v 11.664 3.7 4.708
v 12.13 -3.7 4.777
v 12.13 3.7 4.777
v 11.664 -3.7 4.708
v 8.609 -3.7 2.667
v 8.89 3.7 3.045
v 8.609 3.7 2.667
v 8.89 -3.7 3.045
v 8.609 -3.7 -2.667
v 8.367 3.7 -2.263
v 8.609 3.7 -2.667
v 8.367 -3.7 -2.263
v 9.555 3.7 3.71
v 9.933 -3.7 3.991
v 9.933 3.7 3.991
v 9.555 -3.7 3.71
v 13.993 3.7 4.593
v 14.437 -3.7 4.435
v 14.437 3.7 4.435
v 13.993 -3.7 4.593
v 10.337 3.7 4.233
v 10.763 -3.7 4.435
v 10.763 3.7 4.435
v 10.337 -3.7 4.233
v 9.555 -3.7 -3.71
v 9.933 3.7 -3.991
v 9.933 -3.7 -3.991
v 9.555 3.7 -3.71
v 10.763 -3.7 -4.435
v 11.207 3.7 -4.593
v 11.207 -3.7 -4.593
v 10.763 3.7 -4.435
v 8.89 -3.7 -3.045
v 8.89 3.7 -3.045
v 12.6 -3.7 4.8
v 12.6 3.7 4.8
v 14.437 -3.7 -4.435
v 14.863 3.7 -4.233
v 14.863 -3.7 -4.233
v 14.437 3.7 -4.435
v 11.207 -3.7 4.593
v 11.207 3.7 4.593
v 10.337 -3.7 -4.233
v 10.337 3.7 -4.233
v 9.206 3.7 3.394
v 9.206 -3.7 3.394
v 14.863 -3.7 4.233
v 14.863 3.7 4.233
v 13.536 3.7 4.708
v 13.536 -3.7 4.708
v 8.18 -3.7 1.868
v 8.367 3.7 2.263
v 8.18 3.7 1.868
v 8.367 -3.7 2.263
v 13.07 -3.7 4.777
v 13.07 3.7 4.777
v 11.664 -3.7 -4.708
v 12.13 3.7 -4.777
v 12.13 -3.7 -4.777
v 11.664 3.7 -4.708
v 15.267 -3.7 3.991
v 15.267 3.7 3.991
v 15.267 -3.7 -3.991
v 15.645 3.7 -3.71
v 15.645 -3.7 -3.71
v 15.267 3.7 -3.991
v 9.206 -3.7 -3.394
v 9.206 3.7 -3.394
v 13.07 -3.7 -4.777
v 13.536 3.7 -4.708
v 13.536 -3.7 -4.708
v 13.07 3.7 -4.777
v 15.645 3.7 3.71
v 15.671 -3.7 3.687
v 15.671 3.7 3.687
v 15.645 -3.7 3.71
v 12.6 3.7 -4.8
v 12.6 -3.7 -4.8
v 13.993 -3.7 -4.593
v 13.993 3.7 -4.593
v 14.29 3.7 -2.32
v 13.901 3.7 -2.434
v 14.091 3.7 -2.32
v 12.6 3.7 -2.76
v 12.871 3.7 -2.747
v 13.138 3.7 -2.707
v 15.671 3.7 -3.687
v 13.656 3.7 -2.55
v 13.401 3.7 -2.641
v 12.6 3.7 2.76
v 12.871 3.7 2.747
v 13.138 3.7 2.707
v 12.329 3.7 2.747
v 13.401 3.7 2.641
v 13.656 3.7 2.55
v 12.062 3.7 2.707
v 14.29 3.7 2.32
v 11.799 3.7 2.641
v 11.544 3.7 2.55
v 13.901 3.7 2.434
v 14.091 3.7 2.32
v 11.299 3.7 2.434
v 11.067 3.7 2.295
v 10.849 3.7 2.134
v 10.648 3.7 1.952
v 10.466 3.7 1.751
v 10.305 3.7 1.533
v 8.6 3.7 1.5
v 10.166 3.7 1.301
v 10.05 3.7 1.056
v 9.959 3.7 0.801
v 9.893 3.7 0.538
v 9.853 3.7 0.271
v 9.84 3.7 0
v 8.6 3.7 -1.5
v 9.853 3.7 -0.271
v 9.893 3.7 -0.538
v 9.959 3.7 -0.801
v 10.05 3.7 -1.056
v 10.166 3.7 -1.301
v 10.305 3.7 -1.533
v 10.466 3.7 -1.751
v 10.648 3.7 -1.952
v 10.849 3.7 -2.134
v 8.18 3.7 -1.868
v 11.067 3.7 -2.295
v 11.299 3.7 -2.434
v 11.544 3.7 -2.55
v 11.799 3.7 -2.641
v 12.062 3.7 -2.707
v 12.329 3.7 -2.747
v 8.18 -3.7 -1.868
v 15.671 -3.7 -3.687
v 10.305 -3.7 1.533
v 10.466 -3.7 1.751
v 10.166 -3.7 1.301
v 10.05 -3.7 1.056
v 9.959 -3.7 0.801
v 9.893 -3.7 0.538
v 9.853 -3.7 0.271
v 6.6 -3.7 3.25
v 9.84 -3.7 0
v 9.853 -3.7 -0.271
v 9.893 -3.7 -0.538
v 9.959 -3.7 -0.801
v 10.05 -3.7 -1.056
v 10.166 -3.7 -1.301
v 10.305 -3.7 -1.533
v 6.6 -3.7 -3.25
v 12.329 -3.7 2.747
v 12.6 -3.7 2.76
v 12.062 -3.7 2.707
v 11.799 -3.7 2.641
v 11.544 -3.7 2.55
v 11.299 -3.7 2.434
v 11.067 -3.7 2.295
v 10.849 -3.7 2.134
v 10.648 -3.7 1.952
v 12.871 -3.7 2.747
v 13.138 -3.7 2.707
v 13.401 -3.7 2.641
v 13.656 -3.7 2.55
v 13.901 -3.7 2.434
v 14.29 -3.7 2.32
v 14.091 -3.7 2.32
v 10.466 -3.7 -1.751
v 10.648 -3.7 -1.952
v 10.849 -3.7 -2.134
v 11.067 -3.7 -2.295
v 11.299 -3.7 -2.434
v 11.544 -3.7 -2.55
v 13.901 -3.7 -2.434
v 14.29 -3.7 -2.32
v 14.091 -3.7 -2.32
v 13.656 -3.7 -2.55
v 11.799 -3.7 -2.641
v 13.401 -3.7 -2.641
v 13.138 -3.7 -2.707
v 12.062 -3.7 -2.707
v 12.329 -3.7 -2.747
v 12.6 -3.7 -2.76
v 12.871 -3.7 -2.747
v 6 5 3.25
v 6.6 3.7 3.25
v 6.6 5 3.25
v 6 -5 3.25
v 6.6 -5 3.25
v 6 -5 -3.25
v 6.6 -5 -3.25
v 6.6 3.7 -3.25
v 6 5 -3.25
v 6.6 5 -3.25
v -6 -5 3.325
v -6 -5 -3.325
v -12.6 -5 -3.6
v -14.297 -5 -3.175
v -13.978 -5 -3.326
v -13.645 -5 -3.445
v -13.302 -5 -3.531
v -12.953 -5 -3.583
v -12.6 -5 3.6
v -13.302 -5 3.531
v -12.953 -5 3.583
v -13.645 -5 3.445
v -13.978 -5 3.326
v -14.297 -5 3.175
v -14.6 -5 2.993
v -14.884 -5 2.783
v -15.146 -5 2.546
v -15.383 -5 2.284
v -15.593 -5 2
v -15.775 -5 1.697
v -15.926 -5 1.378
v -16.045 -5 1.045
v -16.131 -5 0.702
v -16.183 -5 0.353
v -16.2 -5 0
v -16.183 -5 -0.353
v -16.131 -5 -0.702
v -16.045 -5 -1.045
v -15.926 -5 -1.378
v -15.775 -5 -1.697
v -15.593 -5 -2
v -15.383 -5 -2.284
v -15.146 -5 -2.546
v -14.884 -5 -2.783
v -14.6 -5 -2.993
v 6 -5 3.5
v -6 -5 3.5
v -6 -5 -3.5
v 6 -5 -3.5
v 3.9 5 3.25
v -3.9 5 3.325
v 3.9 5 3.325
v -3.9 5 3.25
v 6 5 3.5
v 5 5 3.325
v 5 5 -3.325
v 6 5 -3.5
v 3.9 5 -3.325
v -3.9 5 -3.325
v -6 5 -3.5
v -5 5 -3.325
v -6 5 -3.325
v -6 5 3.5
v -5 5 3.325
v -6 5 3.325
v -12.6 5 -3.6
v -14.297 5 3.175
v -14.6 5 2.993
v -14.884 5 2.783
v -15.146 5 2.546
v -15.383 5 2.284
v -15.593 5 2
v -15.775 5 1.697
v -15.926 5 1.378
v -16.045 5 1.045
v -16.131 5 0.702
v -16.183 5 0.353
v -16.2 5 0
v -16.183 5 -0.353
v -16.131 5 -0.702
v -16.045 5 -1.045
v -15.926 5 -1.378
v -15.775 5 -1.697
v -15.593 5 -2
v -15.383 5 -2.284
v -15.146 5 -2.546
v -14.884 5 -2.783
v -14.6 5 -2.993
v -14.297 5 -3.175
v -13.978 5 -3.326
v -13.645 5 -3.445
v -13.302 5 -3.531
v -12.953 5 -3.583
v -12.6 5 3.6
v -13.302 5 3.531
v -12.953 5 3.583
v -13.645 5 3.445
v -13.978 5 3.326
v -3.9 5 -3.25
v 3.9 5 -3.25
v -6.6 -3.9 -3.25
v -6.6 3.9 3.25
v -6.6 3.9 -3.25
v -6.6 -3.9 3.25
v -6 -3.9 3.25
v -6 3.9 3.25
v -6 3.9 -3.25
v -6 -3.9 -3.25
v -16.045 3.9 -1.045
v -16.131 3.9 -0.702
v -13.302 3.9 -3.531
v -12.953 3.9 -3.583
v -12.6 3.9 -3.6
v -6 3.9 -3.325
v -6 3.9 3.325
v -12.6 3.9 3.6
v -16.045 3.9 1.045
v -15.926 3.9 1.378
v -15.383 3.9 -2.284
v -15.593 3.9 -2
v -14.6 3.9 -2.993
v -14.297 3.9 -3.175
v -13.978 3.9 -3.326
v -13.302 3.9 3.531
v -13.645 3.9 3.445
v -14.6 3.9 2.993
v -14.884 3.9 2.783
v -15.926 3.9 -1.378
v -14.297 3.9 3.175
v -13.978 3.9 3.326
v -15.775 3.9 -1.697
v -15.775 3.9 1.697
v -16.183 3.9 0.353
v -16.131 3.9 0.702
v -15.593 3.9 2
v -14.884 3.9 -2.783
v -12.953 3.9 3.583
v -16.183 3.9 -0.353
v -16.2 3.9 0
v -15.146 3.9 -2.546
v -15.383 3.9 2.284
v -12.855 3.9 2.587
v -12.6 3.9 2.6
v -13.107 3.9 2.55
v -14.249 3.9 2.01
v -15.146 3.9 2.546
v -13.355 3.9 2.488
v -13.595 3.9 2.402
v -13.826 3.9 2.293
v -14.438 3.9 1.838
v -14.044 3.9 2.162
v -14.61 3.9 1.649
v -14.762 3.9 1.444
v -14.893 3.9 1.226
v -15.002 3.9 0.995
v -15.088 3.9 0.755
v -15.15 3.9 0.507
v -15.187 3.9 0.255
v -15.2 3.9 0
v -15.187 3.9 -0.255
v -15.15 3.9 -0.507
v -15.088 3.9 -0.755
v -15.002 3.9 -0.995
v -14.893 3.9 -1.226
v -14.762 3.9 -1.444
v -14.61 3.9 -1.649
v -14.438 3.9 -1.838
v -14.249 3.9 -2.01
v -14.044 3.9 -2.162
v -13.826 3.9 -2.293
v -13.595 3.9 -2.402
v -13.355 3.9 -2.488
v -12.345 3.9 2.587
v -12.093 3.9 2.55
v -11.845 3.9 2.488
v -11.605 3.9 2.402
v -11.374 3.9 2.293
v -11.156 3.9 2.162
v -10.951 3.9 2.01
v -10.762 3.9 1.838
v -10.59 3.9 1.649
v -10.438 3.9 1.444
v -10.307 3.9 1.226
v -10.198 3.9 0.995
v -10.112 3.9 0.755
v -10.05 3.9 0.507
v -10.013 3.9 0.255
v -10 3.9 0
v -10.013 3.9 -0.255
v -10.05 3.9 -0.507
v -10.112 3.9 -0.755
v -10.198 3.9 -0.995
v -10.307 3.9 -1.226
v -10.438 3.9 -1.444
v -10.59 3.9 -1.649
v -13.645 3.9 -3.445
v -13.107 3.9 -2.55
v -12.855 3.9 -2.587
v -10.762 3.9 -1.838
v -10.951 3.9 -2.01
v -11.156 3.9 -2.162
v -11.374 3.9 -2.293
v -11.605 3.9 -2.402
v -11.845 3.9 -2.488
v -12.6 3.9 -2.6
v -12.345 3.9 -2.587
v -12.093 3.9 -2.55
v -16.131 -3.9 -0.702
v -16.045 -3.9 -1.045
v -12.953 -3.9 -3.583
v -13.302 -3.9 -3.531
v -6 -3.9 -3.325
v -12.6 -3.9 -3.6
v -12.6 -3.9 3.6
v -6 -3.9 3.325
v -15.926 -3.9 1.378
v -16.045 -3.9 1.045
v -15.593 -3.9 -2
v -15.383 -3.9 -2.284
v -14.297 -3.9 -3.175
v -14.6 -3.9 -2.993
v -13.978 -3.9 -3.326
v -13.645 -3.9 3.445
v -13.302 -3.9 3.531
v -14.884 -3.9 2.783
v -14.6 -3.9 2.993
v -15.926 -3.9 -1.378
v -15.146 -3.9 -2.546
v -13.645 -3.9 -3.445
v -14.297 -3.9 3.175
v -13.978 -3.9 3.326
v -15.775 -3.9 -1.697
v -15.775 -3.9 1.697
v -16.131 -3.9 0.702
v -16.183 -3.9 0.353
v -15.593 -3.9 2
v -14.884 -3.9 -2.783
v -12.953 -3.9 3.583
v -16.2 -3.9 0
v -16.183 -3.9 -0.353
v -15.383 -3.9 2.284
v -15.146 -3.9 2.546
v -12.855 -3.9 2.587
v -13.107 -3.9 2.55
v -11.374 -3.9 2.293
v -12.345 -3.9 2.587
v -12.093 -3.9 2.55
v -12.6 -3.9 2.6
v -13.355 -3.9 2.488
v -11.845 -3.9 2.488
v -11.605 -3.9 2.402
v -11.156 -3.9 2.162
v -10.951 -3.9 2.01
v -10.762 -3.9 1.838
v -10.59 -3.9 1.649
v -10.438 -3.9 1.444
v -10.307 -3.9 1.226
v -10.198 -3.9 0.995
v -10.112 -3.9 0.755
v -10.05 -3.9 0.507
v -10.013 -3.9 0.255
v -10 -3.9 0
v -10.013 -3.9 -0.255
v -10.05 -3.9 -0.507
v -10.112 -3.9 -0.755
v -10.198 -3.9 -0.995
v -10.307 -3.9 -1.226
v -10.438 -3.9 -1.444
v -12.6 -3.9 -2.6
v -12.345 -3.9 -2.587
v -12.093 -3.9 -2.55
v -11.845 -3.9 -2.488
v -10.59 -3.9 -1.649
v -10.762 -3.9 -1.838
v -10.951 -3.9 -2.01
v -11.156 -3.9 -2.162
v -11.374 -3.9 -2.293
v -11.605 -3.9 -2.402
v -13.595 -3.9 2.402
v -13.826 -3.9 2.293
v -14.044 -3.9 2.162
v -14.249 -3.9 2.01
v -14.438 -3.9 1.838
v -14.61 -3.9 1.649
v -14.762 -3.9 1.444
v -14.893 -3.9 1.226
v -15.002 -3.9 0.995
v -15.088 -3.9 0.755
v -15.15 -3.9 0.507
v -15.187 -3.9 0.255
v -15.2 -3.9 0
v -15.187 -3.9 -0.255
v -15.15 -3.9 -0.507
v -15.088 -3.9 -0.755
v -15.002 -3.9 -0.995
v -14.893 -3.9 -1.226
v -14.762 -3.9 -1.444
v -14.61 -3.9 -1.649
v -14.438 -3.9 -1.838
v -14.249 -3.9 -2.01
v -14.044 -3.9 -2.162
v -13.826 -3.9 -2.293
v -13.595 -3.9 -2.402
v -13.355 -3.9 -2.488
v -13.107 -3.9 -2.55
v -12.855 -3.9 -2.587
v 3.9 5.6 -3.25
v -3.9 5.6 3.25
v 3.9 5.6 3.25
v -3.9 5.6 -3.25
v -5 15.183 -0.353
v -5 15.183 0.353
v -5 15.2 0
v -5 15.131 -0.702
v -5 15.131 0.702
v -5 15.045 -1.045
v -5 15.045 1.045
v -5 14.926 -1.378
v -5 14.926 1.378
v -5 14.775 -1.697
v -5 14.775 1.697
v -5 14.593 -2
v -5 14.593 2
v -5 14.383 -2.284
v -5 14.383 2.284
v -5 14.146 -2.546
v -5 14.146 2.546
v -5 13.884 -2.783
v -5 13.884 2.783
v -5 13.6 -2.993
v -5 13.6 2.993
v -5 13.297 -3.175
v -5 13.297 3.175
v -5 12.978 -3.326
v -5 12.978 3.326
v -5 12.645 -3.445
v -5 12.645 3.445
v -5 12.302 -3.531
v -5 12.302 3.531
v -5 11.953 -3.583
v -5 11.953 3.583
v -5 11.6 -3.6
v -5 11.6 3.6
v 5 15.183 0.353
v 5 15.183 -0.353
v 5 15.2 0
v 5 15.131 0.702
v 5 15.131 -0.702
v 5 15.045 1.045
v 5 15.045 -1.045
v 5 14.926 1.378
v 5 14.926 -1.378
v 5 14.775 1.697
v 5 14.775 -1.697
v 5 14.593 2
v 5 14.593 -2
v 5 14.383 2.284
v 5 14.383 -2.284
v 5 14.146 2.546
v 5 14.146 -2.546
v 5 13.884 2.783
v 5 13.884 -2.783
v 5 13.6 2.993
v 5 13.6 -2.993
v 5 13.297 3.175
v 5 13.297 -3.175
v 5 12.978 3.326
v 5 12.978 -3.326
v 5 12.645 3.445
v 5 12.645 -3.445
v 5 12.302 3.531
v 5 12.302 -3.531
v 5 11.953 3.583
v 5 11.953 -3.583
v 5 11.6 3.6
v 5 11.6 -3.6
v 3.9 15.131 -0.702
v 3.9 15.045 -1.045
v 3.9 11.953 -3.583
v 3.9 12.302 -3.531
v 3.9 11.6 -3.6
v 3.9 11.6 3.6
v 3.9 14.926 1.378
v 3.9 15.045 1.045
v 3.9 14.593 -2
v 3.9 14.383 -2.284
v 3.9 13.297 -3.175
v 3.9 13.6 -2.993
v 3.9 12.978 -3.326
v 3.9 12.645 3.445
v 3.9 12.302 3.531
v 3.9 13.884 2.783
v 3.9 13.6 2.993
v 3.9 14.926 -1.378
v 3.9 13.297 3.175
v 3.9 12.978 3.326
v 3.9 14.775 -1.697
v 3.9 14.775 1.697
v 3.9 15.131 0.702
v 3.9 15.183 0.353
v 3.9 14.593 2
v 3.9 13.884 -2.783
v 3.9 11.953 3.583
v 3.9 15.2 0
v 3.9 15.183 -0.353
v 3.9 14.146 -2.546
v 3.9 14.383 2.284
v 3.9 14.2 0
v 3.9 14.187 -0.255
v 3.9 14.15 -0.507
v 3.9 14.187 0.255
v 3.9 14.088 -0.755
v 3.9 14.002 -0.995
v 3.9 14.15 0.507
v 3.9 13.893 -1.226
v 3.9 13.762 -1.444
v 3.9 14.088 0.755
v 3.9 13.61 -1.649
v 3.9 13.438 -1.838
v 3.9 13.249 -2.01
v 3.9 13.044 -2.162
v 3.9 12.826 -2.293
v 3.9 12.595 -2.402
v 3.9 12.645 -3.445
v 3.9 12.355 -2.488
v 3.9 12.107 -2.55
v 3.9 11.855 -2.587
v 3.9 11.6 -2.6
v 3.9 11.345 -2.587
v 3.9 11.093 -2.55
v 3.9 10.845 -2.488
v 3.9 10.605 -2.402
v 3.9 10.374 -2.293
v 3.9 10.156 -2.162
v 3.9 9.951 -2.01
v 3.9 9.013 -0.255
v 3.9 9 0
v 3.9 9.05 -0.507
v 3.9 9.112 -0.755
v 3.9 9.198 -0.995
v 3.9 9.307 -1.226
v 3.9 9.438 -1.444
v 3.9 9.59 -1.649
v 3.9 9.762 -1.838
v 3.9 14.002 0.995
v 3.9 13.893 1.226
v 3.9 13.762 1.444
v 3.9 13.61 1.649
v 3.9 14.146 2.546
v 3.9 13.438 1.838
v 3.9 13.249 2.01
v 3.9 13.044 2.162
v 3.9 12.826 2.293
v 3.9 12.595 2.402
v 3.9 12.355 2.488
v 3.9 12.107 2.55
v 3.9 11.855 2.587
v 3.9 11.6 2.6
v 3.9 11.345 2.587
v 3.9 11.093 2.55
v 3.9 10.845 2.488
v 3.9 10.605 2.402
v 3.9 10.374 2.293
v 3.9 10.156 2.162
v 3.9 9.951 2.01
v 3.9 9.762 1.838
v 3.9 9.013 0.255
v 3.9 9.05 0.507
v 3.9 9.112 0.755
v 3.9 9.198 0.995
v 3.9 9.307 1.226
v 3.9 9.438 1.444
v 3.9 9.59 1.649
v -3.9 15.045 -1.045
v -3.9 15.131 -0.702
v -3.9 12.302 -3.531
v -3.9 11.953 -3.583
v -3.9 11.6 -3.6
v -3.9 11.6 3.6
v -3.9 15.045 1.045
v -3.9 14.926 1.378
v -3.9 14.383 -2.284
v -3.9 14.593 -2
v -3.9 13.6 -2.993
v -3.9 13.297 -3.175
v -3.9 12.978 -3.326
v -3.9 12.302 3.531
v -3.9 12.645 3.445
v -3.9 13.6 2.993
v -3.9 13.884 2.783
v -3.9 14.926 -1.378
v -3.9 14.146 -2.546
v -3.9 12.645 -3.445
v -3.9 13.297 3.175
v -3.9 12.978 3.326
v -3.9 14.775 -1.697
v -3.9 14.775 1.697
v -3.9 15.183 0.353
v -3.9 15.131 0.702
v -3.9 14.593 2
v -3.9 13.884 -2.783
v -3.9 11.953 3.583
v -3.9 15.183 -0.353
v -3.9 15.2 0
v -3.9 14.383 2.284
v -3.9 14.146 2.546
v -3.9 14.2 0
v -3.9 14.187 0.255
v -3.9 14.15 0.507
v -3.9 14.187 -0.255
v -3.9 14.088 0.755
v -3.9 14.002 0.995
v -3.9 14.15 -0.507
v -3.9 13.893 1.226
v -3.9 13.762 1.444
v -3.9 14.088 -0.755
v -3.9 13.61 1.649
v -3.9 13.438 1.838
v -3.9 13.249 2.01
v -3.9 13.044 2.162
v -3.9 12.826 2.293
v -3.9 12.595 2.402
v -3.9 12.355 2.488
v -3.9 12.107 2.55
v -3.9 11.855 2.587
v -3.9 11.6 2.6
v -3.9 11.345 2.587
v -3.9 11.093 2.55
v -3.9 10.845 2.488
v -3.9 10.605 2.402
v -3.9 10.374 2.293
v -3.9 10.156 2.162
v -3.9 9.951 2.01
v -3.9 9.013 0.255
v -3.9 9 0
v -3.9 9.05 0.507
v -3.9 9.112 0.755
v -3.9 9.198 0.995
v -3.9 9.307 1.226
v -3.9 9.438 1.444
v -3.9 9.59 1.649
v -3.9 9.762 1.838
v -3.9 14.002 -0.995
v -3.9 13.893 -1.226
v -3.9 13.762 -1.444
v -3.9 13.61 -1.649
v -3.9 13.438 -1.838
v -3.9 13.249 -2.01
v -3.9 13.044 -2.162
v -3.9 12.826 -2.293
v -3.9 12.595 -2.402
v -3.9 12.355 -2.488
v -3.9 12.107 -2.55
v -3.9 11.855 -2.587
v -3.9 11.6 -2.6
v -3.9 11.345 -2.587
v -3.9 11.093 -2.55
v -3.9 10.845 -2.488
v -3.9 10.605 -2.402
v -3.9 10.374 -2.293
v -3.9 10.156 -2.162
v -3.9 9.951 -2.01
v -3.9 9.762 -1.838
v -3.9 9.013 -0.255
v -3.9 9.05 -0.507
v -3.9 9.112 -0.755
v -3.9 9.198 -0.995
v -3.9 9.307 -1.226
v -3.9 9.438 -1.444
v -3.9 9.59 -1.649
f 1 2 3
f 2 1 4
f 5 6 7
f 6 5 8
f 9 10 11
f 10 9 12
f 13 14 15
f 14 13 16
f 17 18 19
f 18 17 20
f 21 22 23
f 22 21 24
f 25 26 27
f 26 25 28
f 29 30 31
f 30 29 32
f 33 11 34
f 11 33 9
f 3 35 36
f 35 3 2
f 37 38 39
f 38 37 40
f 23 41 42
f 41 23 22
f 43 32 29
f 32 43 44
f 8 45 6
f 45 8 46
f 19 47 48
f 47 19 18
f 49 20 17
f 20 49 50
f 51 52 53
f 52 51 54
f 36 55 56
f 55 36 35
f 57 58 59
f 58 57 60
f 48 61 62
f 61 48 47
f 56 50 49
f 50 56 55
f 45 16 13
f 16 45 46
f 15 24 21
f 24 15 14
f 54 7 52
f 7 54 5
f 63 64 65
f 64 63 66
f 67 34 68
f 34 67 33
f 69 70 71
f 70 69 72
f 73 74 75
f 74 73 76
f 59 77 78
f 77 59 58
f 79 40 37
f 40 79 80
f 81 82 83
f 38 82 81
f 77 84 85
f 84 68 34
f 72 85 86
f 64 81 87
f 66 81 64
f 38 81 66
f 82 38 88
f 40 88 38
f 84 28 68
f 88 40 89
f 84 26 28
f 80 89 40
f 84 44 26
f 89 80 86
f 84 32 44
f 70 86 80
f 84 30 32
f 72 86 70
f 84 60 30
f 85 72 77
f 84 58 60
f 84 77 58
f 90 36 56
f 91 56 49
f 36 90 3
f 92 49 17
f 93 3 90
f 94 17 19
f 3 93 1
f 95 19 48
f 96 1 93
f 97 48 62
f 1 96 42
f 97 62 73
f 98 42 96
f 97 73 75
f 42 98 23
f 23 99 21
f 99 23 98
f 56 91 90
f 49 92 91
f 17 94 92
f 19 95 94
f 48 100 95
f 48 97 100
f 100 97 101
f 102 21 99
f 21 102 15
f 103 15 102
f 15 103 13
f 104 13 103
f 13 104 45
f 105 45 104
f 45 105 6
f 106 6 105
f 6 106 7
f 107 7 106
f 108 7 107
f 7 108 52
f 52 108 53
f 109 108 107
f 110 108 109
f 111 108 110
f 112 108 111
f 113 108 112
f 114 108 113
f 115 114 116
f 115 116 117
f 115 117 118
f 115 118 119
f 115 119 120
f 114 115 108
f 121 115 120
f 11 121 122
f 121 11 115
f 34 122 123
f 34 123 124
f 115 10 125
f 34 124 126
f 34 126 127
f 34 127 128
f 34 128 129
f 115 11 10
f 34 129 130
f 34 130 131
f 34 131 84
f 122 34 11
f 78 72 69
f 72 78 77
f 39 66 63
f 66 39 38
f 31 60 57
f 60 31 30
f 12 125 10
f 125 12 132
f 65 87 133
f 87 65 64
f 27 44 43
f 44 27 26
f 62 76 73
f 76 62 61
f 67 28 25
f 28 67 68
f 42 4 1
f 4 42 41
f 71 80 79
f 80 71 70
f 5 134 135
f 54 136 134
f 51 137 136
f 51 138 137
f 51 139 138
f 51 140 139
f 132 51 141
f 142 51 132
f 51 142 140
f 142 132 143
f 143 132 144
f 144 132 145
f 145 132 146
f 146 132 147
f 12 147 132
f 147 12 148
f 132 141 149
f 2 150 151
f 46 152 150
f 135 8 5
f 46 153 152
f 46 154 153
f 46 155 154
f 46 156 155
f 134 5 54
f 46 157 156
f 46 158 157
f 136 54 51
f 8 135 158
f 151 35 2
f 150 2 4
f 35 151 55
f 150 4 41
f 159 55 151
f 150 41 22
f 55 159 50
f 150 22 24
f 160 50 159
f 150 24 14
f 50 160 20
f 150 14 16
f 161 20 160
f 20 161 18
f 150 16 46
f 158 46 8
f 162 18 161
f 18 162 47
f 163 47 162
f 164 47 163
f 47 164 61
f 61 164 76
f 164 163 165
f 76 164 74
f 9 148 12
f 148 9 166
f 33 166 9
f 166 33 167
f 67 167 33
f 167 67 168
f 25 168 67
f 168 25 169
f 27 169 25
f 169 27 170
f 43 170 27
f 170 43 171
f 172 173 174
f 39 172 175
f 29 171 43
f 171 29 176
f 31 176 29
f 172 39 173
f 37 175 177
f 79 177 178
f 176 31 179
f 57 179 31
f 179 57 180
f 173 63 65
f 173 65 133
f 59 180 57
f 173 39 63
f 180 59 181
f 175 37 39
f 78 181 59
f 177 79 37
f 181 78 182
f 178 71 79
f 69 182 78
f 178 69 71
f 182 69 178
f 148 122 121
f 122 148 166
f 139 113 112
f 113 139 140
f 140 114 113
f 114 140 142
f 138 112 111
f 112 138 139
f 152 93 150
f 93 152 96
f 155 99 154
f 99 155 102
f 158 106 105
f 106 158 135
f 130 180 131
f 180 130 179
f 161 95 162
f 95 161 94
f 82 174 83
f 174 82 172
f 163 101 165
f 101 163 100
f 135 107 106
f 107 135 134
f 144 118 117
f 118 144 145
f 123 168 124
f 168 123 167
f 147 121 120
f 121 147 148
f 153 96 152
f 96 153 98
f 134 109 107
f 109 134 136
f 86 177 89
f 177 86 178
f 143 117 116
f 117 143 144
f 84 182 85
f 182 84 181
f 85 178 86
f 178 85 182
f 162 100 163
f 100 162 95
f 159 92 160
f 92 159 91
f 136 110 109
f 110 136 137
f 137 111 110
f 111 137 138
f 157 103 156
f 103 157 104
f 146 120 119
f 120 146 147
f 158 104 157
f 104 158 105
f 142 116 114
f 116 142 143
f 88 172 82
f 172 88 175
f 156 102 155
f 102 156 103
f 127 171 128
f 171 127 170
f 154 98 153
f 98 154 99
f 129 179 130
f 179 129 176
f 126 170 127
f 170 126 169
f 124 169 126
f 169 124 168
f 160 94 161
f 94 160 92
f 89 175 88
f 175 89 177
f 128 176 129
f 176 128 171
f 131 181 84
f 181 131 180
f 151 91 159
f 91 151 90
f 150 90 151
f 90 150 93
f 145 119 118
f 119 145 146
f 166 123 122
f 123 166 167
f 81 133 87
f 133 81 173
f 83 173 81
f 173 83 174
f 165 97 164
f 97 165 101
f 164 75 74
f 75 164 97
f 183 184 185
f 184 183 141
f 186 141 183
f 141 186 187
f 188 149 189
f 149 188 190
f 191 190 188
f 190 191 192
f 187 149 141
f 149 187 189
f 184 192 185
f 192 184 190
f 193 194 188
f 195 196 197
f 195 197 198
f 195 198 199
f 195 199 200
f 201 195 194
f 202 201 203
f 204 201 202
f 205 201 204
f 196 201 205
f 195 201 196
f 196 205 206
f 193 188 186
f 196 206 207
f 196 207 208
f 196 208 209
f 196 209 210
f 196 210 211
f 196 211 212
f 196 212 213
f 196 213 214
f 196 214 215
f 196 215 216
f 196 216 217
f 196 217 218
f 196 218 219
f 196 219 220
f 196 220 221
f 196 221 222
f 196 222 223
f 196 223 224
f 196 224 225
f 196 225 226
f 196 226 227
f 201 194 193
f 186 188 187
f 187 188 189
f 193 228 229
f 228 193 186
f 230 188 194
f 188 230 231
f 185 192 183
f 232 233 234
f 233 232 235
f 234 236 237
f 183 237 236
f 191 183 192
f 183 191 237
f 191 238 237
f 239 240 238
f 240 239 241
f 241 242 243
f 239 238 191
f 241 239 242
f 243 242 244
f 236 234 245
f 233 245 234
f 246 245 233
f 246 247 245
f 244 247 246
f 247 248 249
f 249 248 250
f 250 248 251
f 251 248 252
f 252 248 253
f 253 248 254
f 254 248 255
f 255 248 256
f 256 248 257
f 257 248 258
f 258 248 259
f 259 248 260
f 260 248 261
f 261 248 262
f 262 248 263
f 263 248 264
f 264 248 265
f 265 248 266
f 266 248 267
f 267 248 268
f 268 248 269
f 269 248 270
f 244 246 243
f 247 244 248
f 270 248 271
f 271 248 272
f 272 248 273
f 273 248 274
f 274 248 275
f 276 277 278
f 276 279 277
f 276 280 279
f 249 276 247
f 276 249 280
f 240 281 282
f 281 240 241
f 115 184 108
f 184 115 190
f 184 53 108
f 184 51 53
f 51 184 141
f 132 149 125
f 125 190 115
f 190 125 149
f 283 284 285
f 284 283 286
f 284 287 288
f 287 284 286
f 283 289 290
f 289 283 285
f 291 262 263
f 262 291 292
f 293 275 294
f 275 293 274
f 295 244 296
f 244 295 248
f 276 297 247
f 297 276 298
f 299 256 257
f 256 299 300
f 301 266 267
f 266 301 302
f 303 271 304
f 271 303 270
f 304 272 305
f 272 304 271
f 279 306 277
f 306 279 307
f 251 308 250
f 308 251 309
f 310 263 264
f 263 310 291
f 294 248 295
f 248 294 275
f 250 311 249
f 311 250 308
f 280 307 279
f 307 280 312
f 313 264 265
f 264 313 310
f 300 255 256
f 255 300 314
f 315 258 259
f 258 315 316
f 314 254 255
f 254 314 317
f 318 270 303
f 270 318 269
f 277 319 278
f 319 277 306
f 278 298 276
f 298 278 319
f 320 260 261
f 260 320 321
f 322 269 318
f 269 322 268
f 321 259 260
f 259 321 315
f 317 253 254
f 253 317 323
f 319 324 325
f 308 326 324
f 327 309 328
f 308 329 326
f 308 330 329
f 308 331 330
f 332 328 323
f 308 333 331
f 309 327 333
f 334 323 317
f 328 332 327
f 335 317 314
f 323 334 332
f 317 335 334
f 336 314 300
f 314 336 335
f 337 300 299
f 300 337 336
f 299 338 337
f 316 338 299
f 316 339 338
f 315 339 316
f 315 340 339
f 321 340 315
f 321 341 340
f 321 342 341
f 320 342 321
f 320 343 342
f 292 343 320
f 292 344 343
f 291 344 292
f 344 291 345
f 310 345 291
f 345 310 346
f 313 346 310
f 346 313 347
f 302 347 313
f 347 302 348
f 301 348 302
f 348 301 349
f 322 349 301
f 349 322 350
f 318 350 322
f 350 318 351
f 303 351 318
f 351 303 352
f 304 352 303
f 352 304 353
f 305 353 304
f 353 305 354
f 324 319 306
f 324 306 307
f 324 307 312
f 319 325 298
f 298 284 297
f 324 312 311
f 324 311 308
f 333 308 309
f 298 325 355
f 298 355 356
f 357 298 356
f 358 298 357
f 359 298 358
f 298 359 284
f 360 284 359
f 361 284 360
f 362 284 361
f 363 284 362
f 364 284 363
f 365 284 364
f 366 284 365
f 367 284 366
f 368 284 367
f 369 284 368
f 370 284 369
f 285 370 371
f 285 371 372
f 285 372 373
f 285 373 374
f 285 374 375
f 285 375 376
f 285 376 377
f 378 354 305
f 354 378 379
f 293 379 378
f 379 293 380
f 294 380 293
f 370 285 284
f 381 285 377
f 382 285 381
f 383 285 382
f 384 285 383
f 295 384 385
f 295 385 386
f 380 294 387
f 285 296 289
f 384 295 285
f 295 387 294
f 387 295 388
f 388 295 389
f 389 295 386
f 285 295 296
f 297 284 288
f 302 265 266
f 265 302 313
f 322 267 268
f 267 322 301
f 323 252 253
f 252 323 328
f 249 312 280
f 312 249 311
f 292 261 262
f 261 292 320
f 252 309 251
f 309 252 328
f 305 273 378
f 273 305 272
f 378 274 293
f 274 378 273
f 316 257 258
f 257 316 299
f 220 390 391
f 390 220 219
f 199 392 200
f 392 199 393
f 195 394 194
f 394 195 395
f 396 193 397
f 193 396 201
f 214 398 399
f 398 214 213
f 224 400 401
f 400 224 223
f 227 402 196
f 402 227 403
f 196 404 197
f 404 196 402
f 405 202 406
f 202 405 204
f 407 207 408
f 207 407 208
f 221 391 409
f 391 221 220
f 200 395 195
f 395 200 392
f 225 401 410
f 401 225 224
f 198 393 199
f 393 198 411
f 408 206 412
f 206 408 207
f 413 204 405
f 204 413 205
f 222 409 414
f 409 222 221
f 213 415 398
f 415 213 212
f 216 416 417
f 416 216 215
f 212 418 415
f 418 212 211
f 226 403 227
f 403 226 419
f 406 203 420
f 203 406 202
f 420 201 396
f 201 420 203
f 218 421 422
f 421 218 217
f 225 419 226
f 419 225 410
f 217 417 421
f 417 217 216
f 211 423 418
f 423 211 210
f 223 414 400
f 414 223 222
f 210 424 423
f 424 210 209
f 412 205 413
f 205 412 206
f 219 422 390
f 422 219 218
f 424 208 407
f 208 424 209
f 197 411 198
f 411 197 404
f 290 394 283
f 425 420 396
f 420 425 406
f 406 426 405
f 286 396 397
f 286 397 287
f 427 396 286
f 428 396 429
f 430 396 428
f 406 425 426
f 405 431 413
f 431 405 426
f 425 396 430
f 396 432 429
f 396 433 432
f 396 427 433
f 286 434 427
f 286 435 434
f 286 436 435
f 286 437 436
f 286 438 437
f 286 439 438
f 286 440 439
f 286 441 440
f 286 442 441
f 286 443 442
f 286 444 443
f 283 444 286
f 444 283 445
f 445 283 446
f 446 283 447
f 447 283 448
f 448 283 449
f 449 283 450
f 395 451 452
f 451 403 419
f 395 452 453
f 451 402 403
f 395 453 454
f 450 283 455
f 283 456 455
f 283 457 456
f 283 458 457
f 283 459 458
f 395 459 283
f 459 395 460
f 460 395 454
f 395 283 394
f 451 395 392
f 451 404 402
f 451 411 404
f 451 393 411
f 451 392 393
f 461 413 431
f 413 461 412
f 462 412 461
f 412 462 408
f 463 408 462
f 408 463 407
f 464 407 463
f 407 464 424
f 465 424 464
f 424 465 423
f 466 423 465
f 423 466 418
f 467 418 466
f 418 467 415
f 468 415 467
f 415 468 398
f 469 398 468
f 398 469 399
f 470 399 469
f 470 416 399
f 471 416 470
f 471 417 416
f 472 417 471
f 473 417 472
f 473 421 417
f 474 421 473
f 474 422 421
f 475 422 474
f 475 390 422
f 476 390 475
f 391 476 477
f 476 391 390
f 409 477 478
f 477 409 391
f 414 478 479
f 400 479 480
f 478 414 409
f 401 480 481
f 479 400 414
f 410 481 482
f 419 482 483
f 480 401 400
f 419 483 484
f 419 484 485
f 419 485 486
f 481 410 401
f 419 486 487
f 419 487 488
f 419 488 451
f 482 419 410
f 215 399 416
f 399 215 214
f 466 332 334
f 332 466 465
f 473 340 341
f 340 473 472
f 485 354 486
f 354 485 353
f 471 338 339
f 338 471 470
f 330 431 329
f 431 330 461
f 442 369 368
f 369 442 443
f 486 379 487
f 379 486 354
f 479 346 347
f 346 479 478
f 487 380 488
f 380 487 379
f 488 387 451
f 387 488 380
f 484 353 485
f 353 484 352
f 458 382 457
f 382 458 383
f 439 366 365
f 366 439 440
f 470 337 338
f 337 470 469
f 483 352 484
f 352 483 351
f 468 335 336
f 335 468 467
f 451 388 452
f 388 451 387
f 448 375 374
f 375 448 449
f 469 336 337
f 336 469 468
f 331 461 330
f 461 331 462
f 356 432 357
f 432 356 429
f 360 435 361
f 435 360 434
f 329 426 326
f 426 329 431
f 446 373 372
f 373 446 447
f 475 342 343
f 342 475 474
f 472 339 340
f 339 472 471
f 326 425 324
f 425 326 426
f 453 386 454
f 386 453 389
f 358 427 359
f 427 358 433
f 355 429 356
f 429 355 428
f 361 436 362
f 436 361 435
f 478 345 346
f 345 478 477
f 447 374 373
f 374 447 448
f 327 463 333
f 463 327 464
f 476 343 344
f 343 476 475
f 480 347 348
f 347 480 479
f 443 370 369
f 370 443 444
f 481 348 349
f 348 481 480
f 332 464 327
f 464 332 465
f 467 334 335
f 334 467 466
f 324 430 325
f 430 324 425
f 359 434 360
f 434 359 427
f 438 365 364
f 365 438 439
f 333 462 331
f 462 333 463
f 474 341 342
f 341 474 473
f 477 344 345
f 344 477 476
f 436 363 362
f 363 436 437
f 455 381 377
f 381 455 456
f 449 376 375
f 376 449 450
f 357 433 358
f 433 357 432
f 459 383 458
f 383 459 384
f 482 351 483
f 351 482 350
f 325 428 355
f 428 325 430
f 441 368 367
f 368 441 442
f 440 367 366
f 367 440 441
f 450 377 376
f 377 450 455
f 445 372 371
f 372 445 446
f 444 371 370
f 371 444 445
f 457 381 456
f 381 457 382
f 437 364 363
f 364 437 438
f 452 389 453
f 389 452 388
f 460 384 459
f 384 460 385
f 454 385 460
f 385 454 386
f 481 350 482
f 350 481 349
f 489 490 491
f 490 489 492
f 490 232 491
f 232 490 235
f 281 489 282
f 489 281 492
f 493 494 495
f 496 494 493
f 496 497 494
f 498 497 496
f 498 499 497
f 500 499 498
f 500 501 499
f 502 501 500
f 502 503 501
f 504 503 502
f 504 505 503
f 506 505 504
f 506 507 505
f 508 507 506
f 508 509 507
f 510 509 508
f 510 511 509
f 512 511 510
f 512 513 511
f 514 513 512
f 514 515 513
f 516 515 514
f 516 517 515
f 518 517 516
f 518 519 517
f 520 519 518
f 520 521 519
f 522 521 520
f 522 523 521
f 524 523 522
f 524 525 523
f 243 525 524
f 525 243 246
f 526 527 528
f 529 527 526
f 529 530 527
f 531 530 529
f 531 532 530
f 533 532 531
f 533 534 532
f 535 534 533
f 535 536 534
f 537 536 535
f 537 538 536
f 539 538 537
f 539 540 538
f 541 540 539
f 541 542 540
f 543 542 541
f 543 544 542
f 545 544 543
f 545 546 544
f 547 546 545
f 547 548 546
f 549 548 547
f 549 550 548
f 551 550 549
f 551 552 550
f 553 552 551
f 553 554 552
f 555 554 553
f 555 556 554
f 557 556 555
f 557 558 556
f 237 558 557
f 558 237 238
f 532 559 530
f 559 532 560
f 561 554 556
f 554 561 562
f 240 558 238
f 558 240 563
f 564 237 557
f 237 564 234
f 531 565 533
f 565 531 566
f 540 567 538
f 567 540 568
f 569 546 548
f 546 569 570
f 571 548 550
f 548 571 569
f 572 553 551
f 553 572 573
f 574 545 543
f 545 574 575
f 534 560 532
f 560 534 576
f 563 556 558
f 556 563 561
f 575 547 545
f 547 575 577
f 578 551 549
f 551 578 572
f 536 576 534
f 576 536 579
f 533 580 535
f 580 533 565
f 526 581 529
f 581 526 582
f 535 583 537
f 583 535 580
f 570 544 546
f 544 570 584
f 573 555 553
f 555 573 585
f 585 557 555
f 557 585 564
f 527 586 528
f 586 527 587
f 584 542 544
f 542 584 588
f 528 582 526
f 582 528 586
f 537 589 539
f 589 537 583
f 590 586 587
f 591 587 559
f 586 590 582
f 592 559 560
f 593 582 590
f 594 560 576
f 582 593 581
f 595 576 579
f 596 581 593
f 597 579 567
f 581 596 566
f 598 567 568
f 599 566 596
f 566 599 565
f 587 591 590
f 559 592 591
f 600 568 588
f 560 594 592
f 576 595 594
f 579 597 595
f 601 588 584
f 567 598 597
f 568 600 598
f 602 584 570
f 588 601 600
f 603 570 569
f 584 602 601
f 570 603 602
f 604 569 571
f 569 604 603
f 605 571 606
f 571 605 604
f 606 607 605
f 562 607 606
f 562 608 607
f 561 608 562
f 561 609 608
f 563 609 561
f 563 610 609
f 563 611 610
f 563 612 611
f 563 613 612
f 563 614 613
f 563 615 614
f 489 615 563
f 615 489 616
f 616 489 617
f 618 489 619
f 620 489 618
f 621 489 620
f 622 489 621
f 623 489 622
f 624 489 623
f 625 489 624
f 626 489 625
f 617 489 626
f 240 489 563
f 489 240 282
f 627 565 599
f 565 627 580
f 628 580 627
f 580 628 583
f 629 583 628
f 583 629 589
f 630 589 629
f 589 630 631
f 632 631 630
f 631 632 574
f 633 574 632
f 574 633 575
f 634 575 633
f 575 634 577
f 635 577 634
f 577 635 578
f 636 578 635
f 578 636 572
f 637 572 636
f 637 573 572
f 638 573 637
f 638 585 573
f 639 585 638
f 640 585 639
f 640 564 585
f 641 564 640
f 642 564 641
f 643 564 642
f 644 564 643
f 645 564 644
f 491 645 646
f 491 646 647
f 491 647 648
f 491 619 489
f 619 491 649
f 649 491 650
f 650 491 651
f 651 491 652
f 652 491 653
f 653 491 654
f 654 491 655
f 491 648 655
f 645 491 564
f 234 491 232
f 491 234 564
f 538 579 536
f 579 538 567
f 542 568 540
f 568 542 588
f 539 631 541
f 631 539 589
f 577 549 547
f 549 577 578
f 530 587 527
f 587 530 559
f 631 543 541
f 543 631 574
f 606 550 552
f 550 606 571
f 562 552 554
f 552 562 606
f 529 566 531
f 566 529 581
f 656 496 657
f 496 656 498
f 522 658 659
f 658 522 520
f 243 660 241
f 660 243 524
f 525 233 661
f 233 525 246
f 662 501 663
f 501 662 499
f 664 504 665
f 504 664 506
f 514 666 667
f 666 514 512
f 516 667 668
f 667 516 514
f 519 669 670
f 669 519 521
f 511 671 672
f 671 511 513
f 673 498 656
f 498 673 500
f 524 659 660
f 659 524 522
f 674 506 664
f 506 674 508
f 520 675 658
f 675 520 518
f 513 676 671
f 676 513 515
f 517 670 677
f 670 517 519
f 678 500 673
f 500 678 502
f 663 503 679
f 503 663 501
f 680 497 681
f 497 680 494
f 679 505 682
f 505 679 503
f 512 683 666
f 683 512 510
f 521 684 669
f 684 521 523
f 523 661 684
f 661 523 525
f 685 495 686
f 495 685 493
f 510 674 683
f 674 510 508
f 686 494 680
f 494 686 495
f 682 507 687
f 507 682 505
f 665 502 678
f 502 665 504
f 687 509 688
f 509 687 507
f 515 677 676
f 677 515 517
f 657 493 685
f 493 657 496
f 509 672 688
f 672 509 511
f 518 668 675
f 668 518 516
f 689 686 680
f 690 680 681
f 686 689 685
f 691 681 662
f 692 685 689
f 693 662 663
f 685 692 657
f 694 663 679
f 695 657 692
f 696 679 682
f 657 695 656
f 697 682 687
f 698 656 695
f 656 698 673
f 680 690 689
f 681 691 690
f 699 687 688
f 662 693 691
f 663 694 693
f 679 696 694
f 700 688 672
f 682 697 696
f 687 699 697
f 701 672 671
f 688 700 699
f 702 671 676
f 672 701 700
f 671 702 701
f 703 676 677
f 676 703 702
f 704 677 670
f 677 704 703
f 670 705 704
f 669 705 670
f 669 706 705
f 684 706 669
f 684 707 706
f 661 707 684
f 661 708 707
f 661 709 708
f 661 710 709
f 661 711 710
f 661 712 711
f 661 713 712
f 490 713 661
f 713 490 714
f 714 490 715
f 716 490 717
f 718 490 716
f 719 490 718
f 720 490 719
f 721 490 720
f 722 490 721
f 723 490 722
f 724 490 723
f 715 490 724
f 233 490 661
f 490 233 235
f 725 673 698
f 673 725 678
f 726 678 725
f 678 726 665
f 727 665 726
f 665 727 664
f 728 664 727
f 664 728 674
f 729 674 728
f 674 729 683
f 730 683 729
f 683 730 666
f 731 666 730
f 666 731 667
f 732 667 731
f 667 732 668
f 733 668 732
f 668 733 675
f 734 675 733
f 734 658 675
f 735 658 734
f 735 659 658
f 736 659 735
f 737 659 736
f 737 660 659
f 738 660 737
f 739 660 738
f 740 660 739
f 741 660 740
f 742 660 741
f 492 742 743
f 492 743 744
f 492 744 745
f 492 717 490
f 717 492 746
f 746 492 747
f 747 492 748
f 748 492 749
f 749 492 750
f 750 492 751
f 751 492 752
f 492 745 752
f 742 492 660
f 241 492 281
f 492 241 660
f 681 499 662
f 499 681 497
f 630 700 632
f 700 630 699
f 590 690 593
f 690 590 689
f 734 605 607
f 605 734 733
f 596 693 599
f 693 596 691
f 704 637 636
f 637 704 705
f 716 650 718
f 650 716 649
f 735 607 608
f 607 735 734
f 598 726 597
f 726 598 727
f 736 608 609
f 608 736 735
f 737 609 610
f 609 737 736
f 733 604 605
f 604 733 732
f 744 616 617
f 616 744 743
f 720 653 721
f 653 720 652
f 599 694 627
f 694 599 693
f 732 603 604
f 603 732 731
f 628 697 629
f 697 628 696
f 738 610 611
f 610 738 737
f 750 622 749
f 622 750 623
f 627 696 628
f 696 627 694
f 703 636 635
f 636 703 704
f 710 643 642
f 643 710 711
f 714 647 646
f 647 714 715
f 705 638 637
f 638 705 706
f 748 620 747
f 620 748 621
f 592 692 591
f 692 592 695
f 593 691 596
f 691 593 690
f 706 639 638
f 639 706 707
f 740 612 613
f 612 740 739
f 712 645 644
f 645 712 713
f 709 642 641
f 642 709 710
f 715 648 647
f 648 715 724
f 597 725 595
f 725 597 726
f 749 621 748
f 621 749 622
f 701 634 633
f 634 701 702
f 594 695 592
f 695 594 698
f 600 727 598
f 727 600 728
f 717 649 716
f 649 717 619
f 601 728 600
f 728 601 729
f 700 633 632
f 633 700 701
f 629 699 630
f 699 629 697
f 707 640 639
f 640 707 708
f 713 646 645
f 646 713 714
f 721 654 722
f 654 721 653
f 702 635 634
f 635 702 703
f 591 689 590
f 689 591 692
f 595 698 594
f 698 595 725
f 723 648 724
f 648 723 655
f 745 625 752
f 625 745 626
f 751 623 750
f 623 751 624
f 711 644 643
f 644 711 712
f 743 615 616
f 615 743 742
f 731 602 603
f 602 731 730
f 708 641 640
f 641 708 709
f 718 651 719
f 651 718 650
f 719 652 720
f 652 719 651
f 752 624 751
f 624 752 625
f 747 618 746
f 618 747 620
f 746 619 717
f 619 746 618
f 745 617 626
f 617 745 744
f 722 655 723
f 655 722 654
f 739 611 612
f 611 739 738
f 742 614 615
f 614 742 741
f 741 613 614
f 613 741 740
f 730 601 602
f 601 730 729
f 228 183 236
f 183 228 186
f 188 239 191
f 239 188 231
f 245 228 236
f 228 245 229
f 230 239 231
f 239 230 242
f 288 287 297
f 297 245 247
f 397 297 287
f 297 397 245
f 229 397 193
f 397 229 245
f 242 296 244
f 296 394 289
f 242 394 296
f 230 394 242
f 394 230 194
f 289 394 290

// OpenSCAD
/* ==========================================================================

   Parametric Modular Snap-Fit Cylindrical Hinge (D)
   Designed by Notydesign
   License: CC BY-NC-SA 4.0 (https://creativecommons.org/licenses/by-nc-sa/4.0/)
   Source: https://github.com/Noty-design/Parametric-designs

   DESCRIPTION
   -----------
   Reusable cylindrical snap-fit hinge with a shaft supported at both ends.
   The cube body is optional. without it the male and female carriers can be 
   used to mount to other models. Just export as STL and assamble with the 
   other model in the slicer. 

   COORDINATES AND UNITS
   ---------------------
   Dimensions in millimetres; angles in degrees. In Array mode, the shaft
   runs along local Y. The Five Sides cube is centred at the origin:
   Front +X, Back -X, Left +Y, Right -Y and Top +Z.
   ========================================================================== */

/* [Layout] */
// Five Sides: independently configurable connectors on five faces.
// Array: multiple hinge stations evenly distributed along a common axis.
layout_mode = "Five Sides"; // [Five Sides, Array]
// Set all faces alike, or choose Custom to configure them individually.
all_sides = "Custom"; // [Custom, None, Male, Female]
/* [Connections (Five Sides)] */
front = "female"; // [none, male, female]
back = "male"; // [none, male, female]
left = "male"; // [none, male, female]
right = "none"; // [none, male, female]
top = "none"; // [none, male, female]
/* [Hinge configuration] */
// Array view/export choice; Five Sides displays the selected face ports.
view_mode = "Assembly"; // [Male, Female, Assembly, Print Male, Print Female]
// Array shaft orientation; in Five Sides this sets the lateral-port axes.
// The Top port always has a horizontal bending axis.
hinge_axis = "Horizontal"; // [Horizontal, Vertical]
// Array: one shaft per station, or one continuous shaft across the array.
// In Five Sides each face has an independent shaft.
shaft_mode = "Separate"; // [Separate, Continuous]
// Five Sides: one central cube. Array: an optional cube on each carrier.
// Disable to use standalone hinge mounting features in another model.
include_cube_body = true; // [false, true]

/* [Station distribution] */
// Width of ONE station along its shaft. In Five Sides mode this is
// the width of EACH port; count and total_width are Array-only.
link_width = 10; // [6:0.5:40]
// Number of stations, in Array mode only.
link_count = 5; // [1:1:30]
// Array mode: OUTSIDE width from the first hinge station's outer face (Y=0)
// to the last hinge station's outer face (Y=total_width).
// Five 10 mm stations over 200 mm -> centres at 5, 52.5, 100, 147.5, 195.
// For one station, only link_width determines its width.
total_width = 200; // [0:1:400]

/* [Joint dimensions] */
shaft_radius = 2.6; // [1.5:0.1:6]
socket_outer_radius = 4.8; // [3.5:0.1:10]
// Narrower than shaft radius so the C-ring retains the pin.
mouth_half_width = 2.32; // [1:0.05:5]
// Thickness of each outer male supporting arm along the shaft.
fork_arm_thickness = 1.1; // [0.8:0.1:3]
// Gap between fork inner faces and the female bearing ends.
axial_end_gap = 0.2; // [0.1:0.05:0.6]
// Outer fork boss radius provides axial end retention.
fork_end_radius = 3.6; // [2.5:0.1:8]
// Spacing measured radially between shaft and socket bore.
joint_fit = "Loose"; // [Firm, Loose, Very Loose]

/* [Mount and optional cube] */
// From shaft centre to mounting-bar centre along X.
mount_offset = 7.2;
mount_bar_thickness = 2.4;
mount_bar_height = 6.5;
// Array mode: cube projects away from the hinge.
// Five Sides mode: a single central cube has dimensions
// [cube_length, link_width, cube_height]; mount rails overlap its faces.
cube_length = 12;
cube_height = 7;
// Used only by the Array Assembly preview; rotates around the shaft.
assembly_angle = 0; // [-90:5:90]

/* [Quality] */
resolution = 64; // [32:16:128]
$fn = resolution;

/* [Hidden] */
eps = 0.02;
function radial_gap(fit) =
    fit == "Firm" ? -0.02 :
    fit == "Loose" ? 0.16 :
    fit == "Very Loose" ? 0.32 : undef;
radial_clearance = radial_gap(joint_fit);
function bearing_start() = fork_arm_thickness + axial_end_gap;
function bearing_width() = link_width-2*bearing_start();

assert(!is_undef(radial_clearance), "Joint fit must be Firm/Loose/Very Loose.");
assert(hinge_axis=="Horizontal" || hinge_axis=="Vertical");
assert(layout_mode=="Array" || layout_mode=="Five Sides", "Choose Array or Five Sides.");
assert(all_sides=="Custom" || all_sides=="None" || all_sides=="Male" || all_sides=="Female");
function valid_side(v) = v=="none" || v=="male" || v=="female";
assert(valid_side(front) && valid_side(back) && valid_side(left) && valid_side(right) && valid_side(top));
assert(shaft_mode=="Separate" || shaft_mode=="Continuous");
assert(link_count>=1 && link_count<=30 && floor(link_count)==link_count);
assert(link_width>=6 && bearing_width()>=3, "Increase link_width for the bearing.");
assert(total_width>=0);
assert(layout_mode!="Array" || link_count==1 ||
  total_width>=link_count*link_width+(link_count-1)*0.5,
  "Total Width must fit all stations plus >= 0.5 mm between neighbours.");
assert(shaft_radius>1);
assert(socket_outer_radius>shaft_radius + max(radial_clearance,0) + 1.1);
assert(mouth_half_width<shaft_radius-0.20 && mouth_half_width>0,
  "C-mouth must be narrower than shaft radius.");
assert(fork_end_radius > shaft_radius+max(radial_clearance,0)+0.4);
assert(fork_end_radius < socket_outer_radius-0.5);
assert(fork_arm_thickness>=0.8 && axial_end_gap>=0.1);
assert(mount_offset>=socket_outer_radius+1.6,
  "Mount bar must clear the C-bearing.");
assert(cube_length>2 && cube_height>=4 && mount_bar_height>=4);
assert(abs(assembly_angle)<=90);

// Orient Y shaft along Z when the vertical variant is selected.
module assembled_pose() {
  if(hinge_axis=="Vertical") rotate([90,0,0]) children();
  else children();
}

// Centred cylinders oriented along the hinge (Y) axis.
module y_cylinder(r,length,cy=0) {
  translate([0,cy,0]) rotate([90,0,0]) cylinder(r=r,h=length,center=true);
}

// A stand-alone male mounting rail; always connects both end supports.
module male_rail(cy) {
  translate([-mount_offset,cy,0])
    cube([mount_bar_thickness,link_width,mount_bar_height],center=true);
}

// End support at each station endpoint: the arc-shaped end boss and
// short radial arm are joined by a solid hull; no central neck exists.
module male_fork_arm(cy) {
  hull() {
    translate([-mount_offset,cy,0])
      cube([mount_bar_thickness, fork_arm_thickness, mount_bar_height],center=true);
    y_cylinder(fork_end_radius,fork_arm_thickness,cy);
  }
}

module male_fork_station(cy, with_cube=include_cube_body) {
  male_rail(cy);
  male_fork_arm(cy-link_width/2+fork_arm_thickness/2);
  male_fork_arm(cy+link_width/2-fork_arm_thickness/2);
  if(shaft_mode=="Separate")
    y_cylinder(shaft_radius,link_width,cy);
  if(with_cube)
    translate([-mount_offset-mount_bar_thickness/2-cube_length/2+0.1,cy,0])
      cube([cube_length,link_width,cube_height],center=true);
}

// Continuous spindle covers Y=0 through Y=total_width for multiple
// stations. For a single station it spans just link_width (Y=0..link_width).
// n=1 is also used to create one independent port on a selected face.
module D_male_array(with_cube=include_cube_body, n=link_count, span=total_width) {
  len_y = n==1 ? link_width : span;
  union() {
    if(shaft_mode=="Continuous")
      y_cylinder(shaft_radius,len_y,len_y/2);
    for(i=[0:n-1])
      male_fork_station(link_width/2 + (n==1 ? 0 : i*(span-link_width)/(n-1)),with_cube);
  }
}

// Female slit goes to X<0, toward the male mounting rail.
module female_bearing(cy) {
  translate([0,cy,0])
    difference() {
      y_cylinder(socket_outer_radius,bearing_width());
      y_cylinder(shaft_radius+radial_clearance,bearing_width()+2*eps);
      // Open C-shaped throat, flared toward -X. A uniform mouth between
      // the two lips avoids a central male neck cutting into rotation.
      rotate([90,0,0])
        linear_extrude(height=bearing_width()+2*eps,center=true)
          polygon(points=[
            [-socket_outer_radius-2.0,-socket_outer_radius-0.8],
            [-socket_outer_radius+0.3,-socket_outer_radius-0.3],
            [-shaft_radius*0.65,-mouth_half_width],
            [0.30,-mouth_half_width],
            [0.30,mouth_half_width],
            [-shaft_radius*0.65,mouth_half_width],
            [-socket_outer_radius+0.3,socket_outer_radius+0.3],
            [-socket_outer_radius-2.0,socket_outer_radius+0.8]
          ]);
    }
}

module female_mount(cy, with_cube=include_cube_body) {
  // The full-width mounting rail makes the socket usable without a cube.
  translate([mount_offset,cy,0])
    cube([mount_bar_thickness,link_width,mount_bar_height],center=true);
  // One centred web supports the open socket behind its bore. The web
  // is separated from the running surface of the cylindrical axle.
  hull() {
    translate([mount_offset,cy,0])
      cube([mount_bar_thickness,bearing_width(),mount_bar_height],center=true);
    translate([socket_outer_radius-0.35,cy,0])
      cube([0.9,bearing_width(),3.0],center=true);
  }
  if(with_cube)
    translate([mount_offset+mount_bar_thickness/2+cube_length/2-0.1,cy,0])
      cube([cube_length,link_width,cube_height],center=true);
}

module D_female_array(with_cube=include_cube_body, n=link_count, span=total_width) {
  union() {
    for(i=[0:n-1]) {
      cy=link_width/2 + (n==1 ? 0 : i*(span-link_width)/(n-1));
      female_bearing(cy);
      female_mount(cy,with_cube);
    }
  }
}

// For assemblies the two separately printable parts are OVERLAID around
// the same shaft and must not be exported as a single fused STL.
module D_assembly() {
  D_male_array();
  rotate([0,assembly_angle,0]) D_female_array();
}

// Print pose: station/shaft Y=0 maps to build-plate Z=0;
// the far outer face maps to Z=total_width (or link_width for one station).
module upright_print_pose() {
  rotate([90,0,0]) children();
}

// Face index order: Front (+X), Back (-X), Left (+Y), Right (-Y), Top (+Z).
function selected_side(i) =
  all_sides == "Male" ? "male" :
  all_sides == "Female" ? "female" :
  all_sides == "None" ? "none" :
  [front,back,left,right,top][i];

// Each canonical connector shaft runs along local +Y. For a female port
// we turn its mounting rail (originally on +X) toward the cube (-X);
// this also turns the female snap mouth outward (+X).
module port_geometry(kind, vertical=false) {
  if (kind=="male") {
    if(vertical)
      rotate([90,0,0]) translate([0,-link_width/2,0])
        D_male_array(with_cube=false,n=1,span=link_width);
    else
      translate([0,-link_width/2,0])
        D_male_array(with_cube=false,n=1,span=link_width);
  } else if(kind=="female") {
    if(vertical)
      rotate([90,0,0]) rotate([0,0,180]) translate([0,-link_width/2,0])
        D_female_array(with_cube=false,n=1,span=link_width);
    else
      rotate([0,0,180]) translate([0,-link_width/2,0])
        D_female_array(with_cube=false,n=1,span=link_width);
  }
}

// Horizontal placement yaw makes local +X point outward from each side.
// Local Y is the tangential hinge axis. The 0.60 overlap into the host
// body avoids coplanar-only contact between mounting rails and cube.
module placed_side_port(i,kind) {
  yaw = [0,180,90,-90][i];
  face = i < 2 ? cube_length/2 : link_width/2;
  rotate([0,0,yaw])
    translate([face+mount_offset-0.60,0,0])
      port_geometry(kind,hinge_axis=="Vertical");
}

// Top: +X maps to +Z. Use a horizontal shaft even when lateral ports use
// vertical axes: a +Z-oriented pin would act as a swivel, not a bend hinge.
module placed_top_port(kind) {
  rotate([0,-90,0])
    translate([cube_height/2+mount_offset-0.60,0,0])
      port_geometry(kind,false);
}

// Build one optional central cube and whichever of the five ports are on.
// Without the cube, ports remain separate mounting features. Fuse them to
// another solid before exporting a single combined printable body.
module D_five_side() {
  union() {
    if(include_cube_body)
      cube([cube_length,link_width,cube_height],center=true);
    for(i=[0:3])
      if(selected_side(i)!="none") placed_side_port(i,selected_side(i));
    if(selected_side(4)!="none") placed_top_port(selected_side(4));
  }
}

if(layout_mode=="Five Sides")
  D_five_side();
else if(view_mode=="Male")
  assembled_pose() D_male_array();
else if(view_mode=="Female")
  assembled_pose() D_female_array();
else if(view_mode=="Assembly")
  assembled_pose() D_assembly();
else if(view_mode=="Print Male")
  upright_print_pose() D_male_array();
else if(view_mode=="Print Female")
  upright_print_pose() D_female_array();
